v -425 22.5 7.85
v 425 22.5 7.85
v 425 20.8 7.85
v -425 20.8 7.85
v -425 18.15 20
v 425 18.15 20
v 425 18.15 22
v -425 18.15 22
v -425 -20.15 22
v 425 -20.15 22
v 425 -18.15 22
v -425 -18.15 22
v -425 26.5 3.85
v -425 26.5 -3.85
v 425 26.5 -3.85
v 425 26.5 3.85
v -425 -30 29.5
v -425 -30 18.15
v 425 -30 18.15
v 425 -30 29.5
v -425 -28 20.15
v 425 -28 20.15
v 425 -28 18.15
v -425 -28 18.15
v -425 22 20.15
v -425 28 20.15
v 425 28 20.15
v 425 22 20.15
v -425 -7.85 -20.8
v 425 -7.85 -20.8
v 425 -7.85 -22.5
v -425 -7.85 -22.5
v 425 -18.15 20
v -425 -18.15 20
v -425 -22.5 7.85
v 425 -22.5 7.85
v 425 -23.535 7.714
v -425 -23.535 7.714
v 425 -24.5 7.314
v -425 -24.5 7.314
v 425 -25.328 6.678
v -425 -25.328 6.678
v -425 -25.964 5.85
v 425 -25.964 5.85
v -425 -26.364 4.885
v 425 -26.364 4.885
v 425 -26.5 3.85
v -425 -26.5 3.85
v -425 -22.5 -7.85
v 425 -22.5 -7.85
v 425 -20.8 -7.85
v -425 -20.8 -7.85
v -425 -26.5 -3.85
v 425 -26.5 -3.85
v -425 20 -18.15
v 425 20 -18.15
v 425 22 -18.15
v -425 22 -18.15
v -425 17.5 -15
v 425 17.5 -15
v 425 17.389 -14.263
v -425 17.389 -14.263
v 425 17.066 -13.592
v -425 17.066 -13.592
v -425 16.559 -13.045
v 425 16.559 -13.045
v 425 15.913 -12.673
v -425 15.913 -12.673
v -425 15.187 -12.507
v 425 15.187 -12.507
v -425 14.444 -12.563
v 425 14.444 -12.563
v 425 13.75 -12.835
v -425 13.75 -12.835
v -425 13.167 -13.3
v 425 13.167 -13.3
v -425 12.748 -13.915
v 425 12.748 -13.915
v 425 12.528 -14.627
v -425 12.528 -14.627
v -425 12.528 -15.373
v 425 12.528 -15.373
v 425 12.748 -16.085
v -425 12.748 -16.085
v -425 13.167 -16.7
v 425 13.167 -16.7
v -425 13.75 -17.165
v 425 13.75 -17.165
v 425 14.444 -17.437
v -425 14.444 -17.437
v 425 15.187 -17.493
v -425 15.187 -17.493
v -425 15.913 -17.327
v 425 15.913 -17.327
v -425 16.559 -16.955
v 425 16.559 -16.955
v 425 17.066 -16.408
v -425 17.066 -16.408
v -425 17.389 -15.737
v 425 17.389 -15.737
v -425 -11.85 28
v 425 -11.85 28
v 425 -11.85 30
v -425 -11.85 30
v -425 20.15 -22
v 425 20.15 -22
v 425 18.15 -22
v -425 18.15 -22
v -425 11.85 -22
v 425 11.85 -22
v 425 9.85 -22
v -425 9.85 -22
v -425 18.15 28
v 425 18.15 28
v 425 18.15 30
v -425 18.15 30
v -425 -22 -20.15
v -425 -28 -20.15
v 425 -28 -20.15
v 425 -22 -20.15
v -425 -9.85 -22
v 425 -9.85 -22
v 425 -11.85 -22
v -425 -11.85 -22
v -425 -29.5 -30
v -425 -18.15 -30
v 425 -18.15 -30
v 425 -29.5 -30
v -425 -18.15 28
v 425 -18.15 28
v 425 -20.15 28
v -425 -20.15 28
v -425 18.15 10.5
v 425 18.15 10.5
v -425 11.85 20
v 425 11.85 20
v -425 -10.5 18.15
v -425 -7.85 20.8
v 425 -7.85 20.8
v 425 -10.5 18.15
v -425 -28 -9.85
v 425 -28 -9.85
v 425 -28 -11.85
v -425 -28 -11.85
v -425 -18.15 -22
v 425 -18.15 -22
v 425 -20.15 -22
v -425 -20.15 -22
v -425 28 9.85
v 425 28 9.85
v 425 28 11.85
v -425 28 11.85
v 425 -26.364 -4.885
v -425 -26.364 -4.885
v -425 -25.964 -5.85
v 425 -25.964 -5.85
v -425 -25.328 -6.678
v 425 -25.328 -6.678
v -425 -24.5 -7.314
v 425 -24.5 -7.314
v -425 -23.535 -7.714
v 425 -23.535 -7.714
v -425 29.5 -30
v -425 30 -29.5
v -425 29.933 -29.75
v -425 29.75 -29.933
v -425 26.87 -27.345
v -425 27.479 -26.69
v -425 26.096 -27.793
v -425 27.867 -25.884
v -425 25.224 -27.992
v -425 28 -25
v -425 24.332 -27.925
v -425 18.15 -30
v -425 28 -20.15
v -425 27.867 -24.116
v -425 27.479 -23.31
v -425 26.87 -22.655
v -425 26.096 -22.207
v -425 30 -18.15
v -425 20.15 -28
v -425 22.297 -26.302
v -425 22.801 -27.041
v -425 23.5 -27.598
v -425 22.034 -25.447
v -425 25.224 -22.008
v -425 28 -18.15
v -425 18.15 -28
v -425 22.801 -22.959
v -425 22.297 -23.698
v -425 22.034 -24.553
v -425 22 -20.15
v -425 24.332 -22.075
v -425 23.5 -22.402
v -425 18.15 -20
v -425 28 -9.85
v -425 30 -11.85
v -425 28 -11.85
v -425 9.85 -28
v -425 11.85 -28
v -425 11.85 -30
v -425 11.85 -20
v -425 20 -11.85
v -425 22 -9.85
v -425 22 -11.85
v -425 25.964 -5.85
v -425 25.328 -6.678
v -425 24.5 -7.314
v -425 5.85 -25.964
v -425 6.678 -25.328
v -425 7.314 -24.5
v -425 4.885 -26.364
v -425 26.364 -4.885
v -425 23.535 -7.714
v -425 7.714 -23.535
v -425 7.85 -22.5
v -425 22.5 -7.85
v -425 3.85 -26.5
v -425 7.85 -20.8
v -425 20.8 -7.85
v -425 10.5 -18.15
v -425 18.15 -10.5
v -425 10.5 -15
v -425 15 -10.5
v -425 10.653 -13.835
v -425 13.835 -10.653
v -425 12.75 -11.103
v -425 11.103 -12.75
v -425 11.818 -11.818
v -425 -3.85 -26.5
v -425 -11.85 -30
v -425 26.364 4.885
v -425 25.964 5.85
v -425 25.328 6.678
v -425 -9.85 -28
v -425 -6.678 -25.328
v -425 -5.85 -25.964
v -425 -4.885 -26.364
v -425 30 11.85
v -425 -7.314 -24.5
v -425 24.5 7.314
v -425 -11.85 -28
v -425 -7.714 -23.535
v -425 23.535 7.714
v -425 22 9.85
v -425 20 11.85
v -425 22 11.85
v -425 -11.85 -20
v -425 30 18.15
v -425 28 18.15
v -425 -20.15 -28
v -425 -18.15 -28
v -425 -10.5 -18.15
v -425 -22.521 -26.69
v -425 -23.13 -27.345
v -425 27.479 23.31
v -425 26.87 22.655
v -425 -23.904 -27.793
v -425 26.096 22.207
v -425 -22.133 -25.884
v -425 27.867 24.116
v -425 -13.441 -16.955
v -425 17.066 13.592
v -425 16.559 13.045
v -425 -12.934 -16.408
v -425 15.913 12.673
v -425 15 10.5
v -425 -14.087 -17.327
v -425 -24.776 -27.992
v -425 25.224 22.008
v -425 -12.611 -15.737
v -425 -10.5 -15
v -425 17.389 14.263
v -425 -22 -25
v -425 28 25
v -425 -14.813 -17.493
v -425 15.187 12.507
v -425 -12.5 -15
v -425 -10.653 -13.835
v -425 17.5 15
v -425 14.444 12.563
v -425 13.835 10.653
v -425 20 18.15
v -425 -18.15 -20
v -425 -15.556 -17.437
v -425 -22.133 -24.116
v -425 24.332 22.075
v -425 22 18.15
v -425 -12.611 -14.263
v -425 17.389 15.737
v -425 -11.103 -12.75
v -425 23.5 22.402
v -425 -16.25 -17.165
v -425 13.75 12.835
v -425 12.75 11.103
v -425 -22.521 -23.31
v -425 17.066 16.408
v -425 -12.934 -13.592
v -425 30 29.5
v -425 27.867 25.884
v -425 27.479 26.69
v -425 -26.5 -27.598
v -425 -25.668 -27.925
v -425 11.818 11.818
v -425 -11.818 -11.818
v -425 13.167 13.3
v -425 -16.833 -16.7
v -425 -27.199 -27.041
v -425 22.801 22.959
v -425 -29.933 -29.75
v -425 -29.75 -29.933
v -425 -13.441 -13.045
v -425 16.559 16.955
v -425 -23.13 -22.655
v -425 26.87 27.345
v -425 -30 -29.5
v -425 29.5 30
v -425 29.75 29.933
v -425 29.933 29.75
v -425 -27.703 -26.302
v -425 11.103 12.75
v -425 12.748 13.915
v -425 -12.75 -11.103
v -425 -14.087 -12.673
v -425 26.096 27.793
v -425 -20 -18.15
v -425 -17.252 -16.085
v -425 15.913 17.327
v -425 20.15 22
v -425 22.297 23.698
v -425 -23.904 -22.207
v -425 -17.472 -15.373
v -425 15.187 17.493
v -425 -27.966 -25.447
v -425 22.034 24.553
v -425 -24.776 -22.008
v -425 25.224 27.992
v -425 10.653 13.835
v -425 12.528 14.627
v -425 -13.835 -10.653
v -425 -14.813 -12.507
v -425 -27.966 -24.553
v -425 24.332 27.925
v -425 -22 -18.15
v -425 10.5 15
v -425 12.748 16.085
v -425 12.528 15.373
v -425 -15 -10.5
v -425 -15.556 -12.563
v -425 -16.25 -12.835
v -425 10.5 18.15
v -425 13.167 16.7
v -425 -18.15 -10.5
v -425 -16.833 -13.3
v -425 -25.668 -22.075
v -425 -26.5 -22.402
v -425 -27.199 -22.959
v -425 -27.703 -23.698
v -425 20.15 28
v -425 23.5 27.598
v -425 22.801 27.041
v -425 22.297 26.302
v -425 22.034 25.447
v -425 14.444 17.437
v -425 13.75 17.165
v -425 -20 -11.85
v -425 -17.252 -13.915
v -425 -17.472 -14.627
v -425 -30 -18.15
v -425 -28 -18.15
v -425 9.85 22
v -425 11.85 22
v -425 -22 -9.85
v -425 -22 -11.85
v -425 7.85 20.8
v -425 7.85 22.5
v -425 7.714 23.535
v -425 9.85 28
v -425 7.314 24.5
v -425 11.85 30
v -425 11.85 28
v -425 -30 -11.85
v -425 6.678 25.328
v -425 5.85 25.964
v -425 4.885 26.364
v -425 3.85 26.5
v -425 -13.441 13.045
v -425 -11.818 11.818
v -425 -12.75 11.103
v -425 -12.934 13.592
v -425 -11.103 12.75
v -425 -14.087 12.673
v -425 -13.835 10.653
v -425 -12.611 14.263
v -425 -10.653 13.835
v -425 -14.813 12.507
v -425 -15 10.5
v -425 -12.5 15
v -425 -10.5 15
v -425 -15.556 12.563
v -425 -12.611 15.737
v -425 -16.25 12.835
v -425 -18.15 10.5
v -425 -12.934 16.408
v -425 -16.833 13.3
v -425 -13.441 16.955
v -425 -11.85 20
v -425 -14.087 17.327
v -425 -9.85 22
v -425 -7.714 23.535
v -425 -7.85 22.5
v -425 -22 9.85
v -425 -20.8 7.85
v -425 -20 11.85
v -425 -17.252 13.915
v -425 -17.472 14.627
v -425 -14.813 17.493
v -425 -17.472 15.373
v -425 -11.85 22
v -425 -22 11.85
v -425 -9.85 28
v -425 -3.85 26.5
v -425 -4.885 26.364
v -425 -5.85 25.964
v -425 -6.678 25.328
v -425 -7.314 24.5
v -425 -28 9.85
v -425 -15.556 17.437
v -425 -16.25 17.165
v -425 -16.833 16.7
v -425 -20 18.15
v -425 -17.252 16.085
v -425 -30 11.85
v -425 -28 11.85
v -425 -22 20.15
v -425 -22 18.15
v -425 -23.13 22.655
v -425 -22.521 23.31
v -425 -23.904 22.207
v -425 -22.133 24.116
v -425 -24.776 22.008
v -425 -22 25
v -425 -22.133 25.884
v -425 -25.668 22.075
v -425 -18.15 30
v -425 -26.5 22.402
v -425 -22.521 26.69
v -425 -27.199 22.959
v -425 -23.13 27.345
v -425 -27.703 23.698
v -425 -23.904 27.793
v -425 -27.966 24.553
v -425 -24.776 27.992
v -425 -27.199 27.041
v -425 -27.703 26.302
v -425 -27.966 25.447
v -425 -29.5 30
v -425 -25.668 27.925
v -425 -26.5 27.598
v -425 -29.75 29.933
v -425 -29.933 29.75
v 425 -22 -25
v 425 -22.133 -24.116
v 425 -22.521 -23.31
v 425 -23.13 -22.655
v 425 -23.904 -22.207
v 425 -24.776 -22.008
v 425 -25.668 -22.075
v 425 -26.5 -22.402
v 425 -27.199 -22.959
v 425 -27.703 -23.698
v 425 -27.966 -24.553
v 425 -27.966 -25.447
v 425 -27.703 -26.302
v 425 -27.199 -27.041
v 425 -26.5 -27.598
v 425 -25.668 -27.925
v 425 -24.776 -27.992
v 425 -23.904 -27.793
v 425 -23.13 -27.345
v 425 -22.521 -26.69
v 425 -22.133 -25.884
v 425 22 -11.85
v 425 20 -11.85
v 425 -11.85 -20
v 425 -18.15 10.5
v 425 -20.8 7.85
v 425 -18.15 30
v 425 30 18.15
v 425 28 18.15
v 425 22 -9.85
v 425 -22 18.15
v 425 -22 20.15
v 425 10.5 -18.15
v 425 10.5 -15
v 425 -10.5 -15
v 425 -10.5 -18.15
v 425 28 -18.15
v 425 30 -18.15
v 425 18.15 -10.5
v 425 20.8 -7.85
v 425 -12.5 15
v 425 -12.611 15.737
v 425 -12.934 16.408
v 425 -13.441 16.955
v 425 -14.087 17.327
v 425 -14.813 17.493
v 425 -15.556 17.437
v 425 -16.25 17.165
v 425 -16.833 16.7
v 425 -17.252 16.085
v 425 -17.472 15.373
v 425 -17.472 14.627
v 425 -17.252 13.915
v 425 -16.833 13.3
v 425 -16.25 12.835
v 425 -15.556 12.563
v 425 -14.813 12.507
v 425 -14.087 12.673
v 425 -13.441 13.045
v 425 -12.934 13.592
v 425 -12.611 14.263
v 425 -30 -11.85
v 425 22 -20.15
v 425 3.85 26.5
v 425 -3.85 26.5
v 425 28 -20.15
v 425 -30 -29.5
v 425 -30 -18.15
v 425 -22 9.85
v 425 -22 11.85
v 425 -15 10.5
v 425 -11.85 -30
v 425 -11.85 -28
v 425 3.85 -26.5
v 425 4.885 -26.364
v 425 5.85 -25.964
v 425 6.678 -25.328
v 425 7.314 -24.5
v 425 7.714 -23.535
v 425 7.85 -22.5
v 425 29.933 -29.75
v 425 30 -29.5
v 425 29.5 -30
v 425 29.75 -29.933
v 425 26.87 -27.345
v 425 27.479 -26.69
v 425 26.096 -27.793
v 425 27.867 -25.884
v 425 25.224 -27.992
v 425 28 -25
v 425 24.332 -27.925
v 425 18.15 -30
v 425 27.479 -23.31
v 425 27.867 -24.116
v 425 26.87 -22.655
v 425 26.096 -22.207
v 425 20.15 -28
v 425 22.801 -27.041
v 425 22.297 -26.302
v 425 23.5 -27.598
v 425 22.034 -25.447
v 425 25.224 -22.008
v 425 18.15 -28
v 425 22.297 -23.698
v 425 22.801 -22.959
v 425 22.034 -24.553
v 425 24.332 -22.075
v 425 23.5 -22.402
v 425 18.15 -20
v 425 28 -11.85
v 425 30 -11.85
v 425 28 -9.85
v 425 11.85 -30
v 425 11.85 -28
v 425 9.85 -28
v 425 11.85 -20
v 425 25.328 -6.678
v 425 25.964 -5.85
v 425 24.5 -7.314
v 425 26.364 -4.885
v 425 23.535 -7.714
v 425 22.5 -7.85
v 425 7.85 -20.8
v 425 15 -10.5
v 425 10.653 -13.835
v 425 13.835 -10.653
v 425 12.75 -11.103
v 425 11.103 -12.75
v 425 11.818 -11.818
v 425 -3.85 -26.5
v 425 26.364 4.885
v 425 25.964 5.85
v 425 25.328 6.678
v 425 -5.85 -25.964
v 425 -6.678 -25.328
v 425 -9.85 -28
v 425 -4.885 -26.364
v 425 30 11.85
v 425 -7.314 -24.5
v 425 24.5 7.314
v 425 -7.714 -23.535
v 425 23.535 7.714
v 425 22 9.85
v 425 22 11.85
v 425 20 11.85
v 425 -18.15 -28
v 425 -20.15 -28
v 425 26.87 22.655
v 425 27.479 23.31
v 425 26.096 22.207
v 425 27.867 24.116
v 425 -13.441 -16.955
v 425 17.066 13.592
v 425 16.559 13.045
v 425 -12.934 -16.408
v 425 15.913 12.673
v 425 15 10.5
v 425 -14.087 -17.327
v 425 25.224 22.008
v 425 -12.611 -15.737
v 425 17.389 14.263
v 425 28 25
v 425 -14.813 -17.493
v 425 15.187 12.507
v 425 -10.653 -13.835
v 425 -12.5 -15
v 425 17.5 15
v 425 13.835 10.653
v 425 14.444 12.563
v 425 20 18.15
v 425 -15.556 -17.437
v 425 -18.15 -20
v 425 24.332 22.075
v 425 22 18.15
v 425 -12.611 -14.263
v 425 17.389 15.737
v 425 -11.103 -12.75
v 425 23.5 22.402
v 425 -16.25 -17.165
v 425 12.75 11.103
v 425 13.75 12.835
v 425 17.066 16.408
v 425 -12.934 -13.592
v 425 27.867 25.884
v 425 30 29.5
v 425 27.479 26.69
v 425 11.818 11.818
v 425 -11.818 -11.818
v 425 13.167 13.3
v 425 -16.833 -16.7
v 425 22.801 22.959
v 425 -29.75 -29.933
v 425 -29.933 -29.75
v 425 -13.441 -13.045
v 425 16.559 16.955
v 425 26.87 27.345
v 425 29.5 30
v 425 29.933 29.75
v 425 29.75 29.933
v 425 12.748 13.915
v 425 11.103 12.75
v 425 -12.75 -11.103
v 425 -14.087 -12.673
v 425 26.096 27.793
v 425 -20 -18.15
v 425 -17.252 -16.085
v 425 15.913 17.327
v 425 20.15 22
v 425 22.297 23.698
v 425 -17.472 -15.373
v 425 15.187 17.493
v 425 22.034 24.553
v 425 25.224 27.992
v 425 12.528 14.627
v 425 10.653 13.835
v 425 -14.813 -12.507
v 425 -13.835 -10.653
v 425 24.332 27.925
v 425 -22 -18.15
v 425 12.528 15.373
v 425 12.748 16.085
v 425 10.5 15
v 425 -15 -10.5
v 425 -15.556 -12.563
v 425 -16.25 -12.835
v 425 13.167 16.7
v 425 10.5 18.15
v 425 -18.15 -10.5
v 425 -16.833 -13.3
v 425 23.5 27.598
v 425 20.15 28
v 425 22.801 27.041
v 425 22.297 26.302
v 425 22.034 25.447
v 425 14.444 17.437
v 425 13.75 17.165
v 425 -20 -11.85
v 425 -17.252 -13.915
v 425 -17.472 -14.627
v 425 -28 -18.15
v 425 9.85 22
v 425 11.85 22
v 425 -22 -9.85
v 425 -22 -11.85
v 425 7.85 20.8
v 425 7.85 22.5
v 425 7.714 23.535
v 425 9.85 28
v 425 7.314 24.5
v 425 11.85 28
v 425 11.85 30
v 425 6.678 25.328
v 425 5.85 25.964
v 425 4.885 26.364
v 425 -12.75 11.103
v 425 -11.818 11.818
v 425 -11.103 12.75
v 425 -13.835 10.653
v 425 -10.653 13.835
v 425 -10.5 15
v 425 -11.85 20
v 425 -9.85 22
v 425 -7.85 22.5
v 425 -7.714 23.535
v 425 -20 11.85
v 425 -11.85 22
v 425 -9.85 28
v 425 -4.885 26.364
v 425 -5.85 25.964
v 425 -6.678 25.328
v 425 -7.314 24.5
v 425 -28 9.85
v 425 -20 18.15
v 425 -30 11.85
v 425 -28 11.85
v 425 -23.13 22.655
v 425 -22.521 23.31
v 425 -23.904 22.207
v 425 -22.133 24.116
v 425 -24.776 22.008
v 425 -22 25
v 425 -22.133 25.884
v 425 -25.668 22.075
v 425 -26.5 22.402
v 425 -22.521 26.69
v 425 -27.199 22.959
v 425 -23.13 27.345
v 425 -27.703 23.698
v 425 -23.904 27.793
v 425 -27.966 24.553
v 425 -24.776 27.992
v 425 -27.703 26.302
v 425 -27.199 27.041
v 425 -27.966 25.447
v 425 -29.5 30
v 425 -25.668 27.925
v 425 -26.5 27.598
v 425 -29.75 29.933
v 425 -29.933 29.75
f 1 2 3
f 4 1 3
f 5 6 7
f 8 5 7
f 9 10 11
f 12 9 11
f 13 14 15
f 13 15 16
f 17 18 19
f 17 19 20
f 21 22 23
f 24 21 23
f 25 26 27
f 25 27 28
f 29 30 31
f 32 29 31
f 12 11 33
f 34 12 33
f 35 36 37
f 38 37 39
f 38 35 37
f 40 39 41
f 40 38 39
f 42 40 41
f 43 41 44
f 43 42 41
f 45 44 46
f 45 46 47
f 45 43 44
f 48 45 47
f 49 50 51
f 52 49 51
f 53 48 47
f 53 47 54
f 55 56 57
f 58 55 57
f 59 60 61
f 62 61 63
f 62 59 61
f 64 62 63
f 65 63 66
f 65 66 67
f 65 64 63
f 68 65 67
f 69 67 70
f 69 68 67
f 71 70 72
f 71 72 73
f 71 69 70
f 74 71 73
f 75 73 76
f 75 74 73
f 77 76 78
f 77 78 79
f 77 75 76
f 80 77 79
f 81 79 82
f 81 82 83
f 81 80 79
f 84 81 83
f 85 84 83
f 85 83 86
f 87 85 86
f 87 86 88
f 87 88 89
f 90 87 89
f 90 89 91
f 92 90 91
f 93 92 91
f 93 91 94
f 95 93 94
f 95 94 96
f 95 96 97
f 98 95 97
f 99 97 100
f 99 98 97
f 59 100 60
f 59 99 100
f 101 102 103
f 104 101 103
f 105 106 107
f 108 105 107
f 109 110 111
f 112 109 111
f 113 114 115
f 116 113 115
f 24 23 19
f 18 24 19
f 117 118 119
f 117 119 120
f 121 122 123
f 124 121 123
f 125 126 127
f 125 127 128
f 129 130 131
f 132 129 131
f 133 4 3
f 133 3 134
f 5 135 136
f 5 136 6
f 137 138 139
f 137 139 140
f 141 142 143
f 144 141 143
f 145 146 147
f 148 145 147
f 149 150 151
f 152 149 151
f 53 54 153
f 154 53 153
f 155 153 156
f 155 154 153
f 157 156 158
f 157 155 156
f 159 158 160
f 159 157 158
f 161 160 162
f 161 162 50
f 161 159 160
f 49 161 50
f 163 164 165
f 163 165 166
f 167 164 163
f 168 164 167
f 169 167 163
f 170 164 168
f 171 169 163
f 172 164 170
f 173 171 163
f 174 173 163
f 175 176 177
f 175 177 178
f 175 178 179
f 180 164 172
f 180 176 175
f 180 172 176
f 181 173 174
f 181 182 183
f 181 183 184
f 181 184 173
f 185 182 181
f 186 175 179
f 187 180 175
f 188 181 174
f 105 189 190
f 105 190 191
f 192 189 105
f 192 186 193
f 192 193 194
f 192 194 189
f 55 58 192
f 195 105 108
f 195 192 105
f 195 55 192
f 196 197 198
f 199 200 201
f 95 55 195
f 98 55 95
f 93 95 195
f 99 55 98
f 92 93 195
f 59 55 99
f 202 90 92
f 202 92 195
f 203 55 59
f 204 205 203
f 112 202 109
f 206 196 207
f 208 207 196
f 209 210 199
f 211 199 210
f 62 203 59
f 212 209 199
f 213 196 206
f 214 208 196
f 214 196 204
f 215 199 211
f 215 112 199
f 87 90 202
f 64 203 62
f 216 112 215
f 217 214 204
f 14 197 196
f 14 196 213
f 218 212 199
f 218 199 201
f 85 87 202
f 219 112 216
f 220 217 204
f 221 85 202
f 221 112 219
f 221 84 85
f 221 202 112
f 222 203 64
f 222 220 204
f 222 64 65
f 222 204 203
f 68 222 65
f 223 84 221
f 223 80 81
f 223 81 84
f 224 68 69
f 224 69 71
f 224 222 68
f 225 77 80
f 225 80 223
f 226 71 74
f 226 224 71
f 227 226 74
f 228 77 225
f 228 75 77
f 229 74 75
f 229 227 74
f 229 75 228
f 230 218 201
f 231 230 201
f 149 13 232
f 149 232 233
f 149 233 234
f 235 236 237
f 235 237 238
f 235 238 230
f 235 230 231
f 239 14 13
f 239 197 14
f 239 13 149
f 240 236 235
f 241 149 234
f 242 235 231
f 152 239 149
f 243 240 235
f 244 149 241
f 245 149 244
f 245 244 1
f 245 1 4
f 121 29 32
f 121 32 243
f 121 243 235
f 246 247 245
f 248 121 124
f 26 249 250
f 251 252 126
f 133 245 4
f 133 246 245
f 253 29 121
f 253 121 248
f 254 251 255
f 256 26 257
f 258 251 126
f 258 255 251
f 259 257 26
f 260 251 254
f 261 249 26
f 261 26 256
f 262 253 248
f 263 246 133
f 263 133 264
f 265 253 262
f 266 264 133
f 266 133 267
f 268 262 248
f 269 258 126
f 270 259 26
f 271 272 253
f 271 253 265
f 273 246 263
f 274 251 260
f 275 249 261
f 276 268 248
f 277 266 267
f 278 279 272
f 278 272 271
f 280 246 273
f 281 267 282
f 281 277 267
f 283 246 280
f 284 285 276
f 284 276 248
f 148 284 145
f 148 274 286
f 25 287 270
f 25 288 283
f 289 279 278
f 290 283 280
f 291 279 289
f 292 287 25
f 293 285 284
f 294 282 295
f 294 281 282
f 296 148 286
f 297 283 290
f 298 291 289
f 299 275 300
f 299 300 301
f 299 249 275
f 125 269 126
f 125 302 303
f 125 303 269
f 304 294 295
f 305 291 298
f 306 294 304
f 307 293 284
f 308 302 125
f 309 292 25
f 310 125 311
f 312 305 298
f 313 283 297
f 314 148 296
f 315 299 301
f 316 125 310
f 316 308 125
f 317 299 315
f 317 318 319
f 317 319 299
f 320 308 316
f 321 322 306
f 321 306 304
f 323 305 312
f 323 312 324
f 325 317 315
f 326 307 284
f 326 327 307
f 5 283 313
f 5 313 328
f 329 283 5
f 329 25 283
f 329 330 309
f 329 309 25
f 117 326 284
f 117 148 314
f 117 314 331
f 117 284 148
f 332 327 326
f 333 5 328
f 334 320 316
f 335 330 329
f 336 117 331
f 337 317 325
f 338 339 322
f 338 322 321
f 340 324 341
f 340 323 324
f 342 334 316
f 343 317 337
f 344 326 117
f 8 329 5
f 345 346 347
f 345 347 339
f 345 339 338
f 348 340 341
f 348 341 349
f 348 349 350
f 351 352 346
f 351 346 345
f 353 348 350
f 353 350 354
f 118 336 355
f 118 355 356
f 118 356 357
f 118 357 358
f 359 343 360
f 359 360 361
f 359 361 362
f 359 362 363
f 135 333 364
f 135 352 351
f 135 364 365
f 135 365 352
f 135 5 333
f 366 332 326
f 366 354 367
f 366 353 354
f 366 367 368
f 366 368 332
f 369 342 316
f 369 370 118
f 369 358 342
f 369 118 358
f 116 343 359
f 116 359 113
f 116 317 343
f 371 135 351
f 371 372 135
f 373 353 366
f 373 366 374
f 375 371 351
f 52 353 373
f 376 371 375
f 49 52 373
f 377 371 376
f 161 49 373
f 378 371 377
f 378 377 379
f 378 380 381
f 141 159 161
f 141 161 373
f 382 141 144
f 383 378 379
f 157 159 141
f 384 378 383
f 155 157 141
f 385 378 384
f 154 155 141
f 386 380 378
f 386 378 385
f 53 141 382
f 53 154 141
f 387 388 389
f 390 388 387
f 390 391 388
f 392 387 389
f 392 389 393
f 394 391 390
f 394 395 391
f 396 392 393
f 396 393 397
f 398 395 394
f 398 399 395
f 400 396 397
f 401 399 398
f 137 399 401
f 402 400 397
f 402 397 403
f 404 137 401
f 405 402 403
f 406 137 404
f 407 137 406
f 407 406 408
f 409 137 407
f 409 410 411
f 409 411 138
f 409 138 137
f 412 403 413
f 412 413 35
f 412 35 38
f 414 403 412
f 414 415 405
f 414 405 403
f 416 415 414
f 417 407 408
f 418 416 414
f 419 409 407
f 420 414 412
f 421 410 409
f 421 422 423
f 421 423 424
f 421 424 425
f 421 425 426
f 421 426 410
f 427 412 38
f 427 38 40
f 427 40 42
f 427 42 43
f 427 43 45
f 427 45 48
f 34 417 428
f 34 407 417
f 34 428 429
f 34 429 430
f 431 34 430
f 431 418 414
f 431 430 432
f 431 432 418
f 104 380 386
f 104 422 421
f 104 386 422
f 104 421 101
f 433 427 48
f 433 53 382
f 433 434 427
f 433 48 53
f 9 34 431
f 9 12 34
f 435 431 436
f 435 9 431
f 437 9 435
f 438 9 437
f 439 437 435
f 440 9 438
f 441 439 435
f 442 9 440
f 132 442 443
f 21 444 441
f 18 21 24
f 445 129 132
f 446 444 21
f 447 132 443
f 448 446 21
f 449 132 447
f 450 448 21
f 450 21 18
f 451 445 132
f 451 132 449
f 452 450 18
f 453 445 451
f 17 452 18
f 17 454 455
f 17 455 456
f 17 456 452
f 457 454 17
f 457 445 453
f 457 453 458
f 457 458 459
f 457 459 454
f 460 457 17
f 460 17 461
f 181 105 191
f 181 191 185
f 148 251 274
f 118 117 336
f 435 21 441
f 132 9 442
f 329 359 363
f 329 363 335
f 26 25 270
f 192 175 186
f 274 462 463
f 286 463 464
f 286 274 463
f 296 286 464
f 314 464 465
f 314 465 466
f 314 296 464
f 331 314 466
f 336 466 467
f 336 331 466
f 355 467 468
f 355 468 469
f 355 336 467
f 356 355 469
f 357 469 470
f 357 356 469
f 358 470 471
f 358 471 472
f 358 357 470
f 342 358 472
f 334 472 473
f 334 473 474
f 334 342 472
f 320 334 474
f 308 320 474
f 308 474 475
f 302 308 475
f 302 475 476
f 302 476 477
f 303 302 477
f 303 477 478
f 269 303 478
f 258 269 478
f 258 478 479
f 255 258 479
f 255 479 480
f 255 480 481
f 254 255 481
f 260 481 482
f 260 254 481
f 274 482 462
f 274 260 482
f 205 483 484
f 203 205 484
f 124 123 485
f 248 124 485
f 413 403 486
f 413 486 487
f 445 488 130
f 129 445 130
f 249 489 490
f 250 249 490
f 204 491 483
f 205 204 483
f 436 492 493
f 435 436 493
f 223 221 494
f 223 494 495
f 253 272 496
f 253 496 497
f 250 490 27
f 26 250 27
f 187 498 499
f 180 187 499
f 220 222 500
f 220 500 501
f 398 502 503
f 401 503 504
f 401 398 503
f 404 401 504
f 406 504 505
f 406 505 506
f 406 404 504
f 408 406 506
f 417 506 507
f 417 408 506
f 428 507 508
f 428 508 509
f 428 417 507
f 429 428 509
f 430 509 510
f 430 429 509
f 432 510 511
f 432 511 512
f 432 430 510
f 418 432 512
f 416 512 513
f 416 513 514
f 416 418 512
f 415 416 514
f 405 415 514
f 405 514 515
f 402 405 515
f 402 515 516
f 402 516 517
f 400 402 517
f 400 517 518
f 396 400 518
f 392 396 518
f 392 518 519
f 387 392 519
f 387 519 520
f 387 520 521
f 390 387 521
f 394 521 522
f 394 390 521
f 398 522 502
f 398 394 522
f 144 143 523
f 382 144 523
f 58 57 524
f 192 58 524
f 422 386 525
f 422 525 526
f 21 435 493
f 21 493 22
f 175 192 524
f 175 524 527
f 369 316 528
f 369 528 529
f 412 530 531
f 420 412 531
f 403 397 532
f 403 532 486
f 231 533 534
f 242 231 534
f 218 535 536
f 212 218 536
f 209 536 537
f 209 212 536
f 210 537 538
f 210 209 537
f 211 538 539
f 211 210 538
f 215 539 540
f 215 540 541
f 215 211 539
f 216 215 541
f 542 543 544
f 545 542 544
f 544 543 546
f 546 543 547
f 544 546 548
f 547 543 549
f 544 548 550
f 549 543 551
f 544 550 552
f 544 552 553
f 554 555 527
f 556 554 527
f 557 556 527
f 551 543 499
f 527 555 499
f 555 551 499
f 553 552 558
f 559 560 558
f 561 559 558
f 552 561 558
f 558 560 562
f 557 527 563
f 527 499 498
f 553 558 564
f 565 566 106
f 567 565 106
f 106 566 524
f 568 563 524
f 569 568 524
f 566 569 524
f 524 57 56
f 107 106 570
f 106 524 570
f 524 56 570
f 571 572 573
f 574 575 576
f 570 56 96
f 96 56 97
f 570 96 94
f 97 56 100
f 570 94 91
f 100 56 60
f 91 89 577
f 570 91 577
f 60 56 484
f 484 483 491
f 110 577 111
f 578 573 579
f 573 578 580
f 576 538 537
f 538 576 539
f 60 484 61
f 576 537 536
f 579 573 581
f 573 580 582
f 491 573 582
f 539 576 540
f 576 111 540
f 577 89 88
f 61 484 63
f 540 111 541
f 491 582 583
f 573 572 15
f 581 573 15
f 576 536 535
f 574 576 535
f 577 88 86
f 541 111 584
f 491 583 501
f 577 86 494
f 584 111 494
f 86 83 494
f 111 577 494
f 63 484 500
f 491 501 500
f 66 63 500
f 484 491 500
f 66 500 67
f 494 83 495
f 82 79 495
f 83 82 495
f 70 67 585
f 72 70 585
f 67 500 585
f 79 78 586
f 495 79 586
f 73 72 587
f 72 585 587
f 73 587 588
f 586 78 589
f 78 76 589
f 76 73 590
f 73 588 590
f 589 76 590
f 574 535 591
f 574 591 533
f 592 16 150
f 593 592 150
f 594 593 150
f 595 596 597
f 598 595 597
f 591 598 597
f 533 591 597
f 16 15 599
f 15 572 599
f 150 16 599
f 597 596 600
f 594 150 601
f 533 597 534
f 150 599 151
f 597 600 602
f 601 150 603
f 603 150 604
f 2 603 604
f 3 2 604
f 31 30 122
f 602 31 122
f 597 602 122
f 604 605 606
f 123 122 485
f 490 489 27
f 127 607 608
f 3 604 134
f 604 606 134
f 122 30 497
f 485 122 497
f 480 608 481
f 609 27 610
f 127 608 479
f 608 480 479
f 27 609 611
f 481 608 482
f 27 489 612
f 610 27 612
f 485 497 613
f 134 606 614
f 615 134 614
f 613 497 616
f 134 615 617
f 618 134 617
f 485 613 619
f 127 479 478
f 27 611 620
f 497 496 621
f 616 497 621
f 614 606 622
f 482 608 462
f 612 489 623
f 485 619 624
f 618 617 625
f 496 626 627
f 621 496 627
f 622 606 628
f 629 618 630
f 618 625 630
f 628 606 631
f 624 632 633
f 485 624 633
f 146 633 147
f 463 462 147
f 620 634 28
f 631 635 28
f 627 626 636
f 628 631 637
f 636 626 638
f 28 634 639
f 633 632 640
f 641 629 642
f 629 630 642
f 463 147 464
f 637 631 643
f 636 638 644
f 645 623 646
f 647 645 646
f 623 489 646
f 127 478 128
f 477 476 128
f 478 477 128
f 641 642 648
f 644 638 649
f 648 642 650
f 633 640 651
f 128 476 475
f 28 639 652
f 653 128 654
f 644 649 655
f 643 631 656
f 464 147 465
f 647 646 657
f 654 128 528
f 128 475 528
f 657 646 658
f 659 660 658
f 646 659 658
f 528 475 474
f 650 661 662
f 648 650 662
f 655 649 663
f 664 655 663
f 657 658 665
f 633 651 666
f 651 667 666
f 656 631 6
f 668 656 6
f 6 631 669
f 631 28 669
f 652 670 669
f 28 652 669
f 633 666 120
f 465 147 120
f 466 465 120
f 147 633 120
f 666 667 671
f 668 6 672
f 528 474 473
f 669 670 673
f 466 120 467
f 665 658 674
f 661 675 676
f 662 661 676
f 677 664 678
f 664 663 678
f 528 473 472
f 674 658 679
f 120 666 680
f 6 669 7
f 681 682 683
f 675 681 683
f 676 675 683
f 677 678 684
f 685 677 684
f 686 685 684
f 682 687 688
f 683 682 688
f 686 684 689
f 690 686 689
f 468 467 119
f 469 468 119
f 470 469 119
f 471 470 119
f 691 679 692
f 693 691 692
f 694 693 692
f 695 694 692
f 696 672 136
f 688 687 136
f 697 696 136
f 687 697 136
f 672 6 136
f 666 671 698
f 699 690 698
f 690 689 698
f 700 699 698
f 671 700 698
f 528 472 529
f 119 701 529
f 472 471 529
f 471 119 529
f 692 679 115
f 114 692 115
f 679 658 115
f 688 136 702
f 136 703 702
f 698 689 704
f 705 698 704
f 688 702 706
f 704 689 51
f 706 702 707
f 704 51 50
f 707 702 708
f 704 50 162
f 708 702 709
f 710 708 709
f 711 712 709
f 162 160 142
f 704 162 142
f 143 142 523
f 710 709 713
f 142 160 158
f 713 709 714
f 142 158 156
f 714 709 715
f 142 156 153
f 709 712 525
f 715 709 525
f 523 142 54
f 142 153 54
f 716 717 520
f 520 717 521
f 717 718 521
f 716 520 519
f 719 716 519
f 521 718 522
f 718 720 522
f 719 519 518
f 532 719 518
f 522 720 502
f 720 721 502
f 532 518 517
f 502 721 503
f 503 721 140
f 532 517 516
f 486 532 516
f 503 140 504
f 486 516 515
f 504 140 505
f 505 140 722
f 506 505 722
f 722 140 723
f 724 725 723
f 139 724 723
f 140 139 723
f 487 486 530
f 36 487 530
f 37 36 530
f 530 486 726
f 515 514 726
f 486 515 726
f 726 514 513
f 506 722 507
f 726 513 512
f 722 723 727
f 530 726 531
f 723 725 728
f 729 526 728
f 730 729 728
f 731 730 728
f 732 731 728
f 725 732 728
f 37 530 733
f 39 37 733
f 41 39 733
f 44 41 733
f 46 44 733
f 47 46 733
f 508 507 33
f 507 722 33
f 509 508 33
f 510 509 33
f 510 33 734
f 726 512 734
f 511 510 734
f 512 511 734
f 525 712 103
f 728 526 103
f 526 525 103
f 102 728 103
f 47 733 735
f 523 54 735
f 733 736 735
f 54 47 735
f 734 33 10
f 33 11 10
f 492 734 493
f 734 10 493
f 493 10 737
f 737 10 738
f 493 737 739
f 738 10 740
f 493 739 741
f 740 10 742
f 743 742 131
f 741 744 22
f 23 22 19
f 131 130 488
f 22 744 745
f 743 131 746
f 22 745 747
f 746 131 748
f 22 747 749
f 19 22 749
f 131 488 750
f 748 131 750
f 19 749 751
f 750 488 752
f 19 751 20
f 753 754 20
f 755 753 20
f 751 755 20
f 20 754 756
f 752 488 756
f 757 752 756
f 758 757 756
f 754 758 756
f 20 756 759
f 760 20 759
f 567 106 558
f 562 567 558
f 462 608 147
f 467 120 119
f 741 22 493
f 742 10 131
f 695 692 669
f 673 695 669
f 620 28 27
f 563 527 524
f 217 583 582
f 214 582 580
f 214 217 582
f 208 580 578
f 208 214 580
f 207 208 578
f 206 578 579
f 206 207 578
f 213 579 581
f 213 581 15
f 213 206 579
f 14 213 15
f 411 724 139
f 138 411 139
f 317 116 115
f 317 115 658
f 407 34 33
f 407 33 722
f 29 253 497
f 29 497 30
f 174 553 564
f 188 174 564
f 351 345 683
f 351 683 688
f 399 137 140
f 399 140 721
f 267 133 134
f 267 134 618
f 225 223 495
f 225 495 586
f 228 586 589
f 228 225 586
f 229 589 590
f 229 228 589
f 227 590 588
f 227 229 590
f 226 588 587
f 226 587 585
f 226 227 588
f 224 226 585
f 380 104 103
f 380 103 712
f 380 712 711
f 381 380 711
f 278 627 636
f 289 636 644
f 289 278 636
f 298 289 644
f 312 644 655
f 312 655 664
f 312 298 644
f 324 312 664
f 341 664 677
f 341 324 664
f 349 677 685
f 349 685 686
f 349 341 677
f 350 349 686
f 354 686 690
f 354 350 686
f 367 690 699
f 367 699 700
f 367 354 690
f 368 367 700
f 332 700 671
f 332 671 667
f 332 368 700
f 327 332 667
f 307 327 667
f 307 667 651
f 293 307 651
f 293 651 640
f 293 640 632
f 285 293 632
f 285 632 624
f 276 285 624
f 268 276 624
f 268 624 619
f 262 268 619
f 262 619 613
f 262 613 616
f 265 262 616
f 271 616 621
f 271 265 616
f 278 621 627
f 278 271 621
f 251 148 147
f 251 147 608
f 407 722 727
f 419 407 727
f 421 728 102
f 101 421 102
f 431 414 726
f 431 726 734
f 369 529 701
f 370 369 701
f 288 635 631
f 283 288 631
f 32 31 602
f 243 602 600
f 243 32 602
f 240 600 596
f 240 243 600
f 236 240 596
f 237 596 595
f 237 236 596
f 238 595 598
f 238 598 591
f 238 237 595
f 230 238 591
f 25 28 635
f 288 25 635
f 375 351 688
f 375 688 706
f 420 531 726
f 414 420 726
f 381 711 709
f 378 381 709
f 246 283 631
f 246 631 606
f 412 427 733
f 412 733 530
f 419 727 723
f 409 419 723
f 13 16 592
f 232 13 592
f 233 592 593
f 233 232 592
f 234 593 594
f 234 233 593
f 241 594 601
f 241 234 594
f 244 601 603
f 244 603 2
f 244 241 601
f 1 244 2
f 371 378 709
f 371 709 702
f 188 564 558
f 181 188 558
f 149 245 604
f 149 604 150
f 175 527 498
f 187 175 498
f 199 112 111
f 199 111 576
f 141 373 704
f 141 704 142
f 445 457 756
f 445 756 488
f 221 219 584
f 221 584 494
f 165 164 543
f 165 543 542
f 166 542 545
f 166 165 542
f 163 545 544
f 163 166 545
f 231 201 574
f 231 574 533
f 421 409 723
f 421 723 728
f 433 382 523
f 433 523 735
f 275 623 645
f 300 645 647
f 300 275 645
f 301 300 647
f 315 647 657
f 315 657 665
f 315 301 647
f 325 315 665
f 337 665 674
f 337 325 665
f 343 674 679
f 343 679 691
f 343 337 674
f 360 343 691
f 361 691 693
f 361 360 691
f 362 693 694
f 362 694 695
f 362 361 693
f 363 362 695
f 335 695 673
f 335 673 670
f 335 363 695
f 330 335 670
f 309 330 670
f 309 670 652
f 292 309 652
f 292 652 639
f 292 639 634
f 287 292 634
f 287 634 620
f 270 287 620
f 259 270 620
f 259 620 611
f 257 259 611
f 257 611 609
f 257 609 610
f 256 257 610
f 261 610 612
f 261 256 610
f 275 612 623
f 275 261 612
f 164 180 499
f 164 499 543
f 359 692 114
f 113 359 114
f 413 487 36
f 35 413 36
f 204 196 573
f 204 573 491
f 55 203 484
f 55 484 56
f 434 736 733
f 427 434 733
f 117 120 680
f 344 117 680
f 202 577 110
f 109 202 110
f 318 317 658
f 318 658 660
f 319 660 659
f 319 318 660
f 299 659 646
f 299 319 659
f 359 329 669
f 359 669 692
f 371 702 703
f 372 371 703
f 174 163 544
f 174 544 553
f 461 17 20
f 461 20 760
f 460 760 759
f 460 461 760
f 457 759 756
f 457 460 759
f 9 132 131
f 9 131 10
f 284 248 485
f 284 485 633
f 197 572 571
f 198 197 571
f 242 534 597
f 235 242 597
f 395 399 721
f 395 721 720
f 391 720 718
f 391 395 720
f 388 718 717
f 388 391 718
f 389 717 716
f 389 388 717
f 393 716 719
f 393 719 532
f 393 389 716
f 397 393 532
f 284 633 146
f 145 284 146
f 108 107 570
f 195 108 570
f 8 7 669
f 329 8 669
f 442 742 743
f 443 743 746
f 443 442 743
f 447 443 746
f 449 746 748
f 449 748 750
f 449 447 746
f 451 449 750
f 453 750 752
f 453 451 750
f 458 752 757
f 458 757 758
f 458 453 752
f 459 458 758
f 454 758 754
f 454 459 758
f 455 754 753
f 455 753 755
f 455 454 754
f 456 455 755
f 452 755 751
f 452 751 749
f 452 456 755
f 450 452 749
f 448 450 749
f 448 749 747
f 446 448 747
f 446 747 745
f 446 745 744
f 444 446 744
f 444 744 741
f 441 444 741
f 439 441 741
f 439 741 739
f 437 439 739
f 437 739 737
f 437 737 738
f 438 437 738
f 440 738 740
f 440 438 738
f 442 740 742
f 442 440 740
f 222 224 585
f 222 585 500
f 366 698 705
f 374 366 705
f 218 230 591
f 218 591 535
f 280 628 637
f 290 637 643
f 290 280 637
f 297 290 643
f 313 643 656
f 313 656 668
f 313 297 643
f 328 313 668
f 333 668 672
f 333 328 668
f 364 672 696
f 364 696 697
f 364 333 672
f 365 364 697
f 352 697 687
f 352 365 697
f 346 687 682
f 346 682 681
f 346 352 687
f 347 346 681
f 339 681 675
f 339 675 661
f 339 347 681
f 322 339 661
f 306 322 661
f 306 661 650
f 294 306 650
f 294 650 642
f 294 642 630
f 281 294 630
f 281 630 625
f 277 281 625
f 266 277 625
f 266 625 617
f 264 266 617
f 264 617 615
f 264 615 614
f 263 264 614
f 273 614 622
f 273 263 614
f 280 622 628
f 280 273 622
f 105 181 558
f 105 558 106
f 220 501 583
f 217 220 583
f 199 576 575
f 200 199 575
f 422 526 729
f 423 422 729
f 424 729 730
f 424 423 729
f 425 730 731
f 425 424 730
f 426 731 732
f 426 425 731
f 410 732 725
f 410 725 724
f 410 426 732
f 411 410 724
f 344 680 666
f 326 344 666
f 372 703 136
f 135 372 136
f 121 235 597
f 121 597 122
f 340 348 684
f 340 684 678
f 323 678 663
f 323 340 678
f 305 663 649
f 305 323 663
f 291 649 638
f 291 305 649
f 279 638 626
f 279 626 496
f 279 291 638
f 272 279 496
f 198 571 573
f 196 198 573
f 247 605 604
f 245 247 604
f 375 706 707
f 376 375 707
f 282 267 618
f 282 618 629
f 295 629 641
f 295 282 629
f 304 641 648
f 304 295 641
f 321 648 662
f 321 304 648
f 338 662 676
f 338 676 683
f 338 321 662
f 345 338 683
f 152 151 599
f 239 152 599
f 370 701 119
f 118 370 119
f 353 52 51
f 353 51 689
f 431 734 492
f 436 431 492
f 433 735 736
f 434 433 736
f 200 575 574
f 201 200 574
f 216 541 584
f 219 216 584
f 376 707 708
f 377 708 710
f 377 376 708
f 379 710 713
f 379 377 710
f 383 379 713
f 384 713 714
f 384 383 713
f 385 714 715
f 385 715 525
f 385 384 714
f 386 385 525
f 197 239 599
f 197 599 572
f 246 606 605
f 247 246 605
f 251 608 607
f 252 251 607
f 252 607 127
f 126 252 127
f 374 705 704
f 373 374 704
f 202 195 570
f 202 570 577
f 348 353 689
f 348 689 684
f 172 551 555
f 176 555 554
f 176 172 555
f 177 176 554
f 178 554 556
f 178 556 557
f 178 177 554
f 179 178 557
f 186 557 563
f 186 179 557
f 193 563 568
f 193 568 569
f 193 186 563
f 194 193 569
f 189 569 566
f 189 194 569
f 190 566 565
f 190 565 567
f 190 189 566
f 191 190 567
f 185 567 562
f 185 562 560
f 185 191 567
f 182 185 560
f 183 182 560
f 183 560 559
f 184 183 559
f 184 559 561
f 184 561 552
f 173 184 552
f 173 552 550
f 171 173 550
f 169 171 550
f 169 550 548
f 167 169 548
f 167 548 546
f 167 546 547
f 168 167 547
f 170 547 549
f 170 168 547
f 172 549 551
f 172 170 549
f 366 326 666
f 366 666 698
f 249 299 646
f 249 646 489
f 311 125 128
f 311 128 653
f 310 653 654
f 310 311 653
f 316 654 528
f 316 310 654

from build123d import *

# Parameters (mm, degrees)
SKETCH_14_R                 = 3
SKETCH_14_R_2               = 2.5
GB_T5237_2004_6060G_1_DEPTH = 850


with BuildPart() as part:
    # 草图14 → 铝型材（gb t5237-2004） 6060G(1) (new body)
    with BuildSketch(Plane.YZ.offset(-425)):
        with BuildLine():
            Line((28, -18.15), (30, -18.15))
            Line((30, -18.15), (30, -29.5))
            ThreePointArc((30, -29.5), (29.853553391, -29.853553391), (29.5, -30))
            Line((29.5, -30), (18.15, -30))
            Line((18.15, -30), (18.15, -28))
            Line((18.15, -28), (20.15, -28))
            Line((20.15, -28), (20.15, -22))
            Line((20.15, -22), (18.15, -22))
            Line((18.15, -22), (18.15, -20))
            Line((18.15, -20), (11.85, -20))
            Line((11.85, -20), (11.85, -22))
            Line((11.85, -22), (9.85, -22))
            Line((9.85, -22), (9.85, -28))
            Line((9.85, -28), (11.85, -28))
            Line((11.85, -28), (11.85, -30))
            Line((11.85, -30), (-11.85, -30))
            Line((-11.85, -30), (-11.85, -28))
            Line((-11.85, -28), (-9.85, -28))
            Line((-9.85, -28), (-9.85, -22))
            Line((-9.85, -22), (-11.85, -22))
            Line((-11.85, -22), (-11.85, -20))
            Line((-11.85, -20), (-18.15, -20))
            Line((-18.15, -20), (-18.15, -22))
            Line((-18.15, -22), (-20.15, -22))
            Line((-20.15, -22), (-20.15, -28))
            Line((-20.15, -28), (-18.15, -28))
            Line((-18.15, -28), (-18.15, -30))
            Line((-18.15, -30), (-29.5, -30))
            ThreePointArc((-29.5, -30), (-29.853553391, -29.853553391), (-30, -29.5))
            Line((-30, -29.5), (-30, -18.15))
            Line((-30, -18.15), (-28, -18.15))
            Line((-28, -18.15), (-28, -20.15))
            Line((-28, -20.15), (-22, -20.15))
            Line((-22, -20.15), (-22, -18.15))
            Line((-22, -18.15), (-20, -18.15))
            Line((-20, -18.15), (-20, -11.85))
            Line((-20, -11.85), (-22, -11.85))
            Line((-22, -11.85), (-22, -9.85))
            Line((-22, -9.85), (-28, -9.85))
            Line((-28, -9.85), (-28, -11.85))
            Line((-28, -11.85), (-30, -11.85))
            Line((-30, -11.85), (-30, 11.85))
            Line((-30, 11.85), (-28, 11.85))
            Line((-28, 11.85), (-28, 9.85))
            Line((-28, 9.85), (-22, 9.85))
            Line((-22, 9.85), (-22, 11.85))
            Line((-22, 11.85), (-20, 11.85))
            Line((-20, 11.85), (-20, 18.15))
            Line((-20, 18.15), (-22, 18.15))
            Line((-22, 18.15), (-22, 20.15))
            Line((-22, 20.15), (-28, 20.15))
            Line((-28, 20.15), (-28, 18.15))
            Line((-28, 18.15), (-30, 18.15))
            Line((-30, 18.15), (-30, 29.5))
            ThreePointArc((-30, 29.5), (-29.853553391, 29.853553391), (-29.5, 30))
            Line((-29.5, 30), (-18.15, 30))
            Line((-18.15, 30), (-18.15, 28))
            Line((-18.15, 28), (-20.15, 28))
            Line((-20.15, 28), (-20.15, 22))
            Line((-20.15, 22), (-18.15, 22))
            Line((-18.15, 22), (-18.15, 20))
            Line((-18.15, 20), (-11.85, 20))
            Line((-11.85, 20), (-11.85, 22))
            Line((-11.85, 22), (-9.85, 22))
            Line((-9.85, 22), (-9.85, 28))
            Line((-9.85, 28), (-11.85, 28))
            Line((-11.85, 28), (-11.85, 30))
            Line((-11.85, 30), (11.85, 30))
            Line((11.85, 30), (11.85, 28))
            Line((11.85, 28), (9.85, 28))
            Line((9.85, 28), (9.85, 22))
            Line((9.85, 22), (11.85, 22))
            Line((11.85, 22), (11.85, 20))
            Line((11.85, 20), (18.15, 20))
            Line((18.15, 20), (18.15, 22))
            Line((18.15, 22), (20.15, 22))
            Line((20.15, 22), (20.15, 28))
            Line((20.15, 28), (18.15, 28))
            Line((18.15, 28), (18.15, 30))
            Line((18.15, 30), (29.5, 30))
            ThreePointArc((29.5, 30), (29.853553391, 29.853553391), (30, 29.5))
            Line((30, 29.5), (30, 18.15))
            Line((30, 18.15), (28, 18.15))
            Line((28, 18.15), (28, 20.15))
            Line((28, 20.15), (22, 20.15))
            Line((22, 20.15), (22, 18.15))
            Line((22, 18.15), (20, 18.15))
            Line((20, 18.15), (20, 11.85))
            Line((20, 11.85), (22, 11.85))
            Line((22, 11.85), (22, 9.85))
            Line((22, 9.85), (28, 9.85))
            Line((28, 9.85), (28, 11.85))
            Line((28, 11.85), (30, 11.85))
            Line((30, 11.85), (30, -11.85))
            Line((30, -11.85), (28, -11.85))
            Line((28, -11.85), (28, -9.85))
            Line((28, -9.85), (22, -9.85))
            Line((22, -9.85), (22, -11.85))
            Line((22, -11.85), (20, -11.85))
            Line((20, -11.85), (20, -18.15))
            Line((20, -18.15), (22, -18.15))
            Line((22, -18.15), (22, -20.15))
            Line((22, -20.15), (28, -20.15))
            Line((28, -20.15), (28, -18.15))
        make_face()
        with Locations((25, 25)):
            Circle(SKETCH_14_R, mode=Mode.SUBTRACT)
        with Locations((-15, 15)):
            Circle(SKETCH_14_R_2, mode=Mode.SUBTRACT)
        with Locations((-25, -25)):
            Circle(SKETCH_14_R, mode=Mode.SUBTRACT)
        with Locations((25, -25)):
            Circle(SKETCH_14_R, mode=Mode.SUBTRACT)
        with Locations((15, -15)):
            Circle(SKETCH_14_R_2, mode=Mode.SUBTRACT)
        with Locations((-15, -15)):
            Circle(SKETCH_14_R_2, mode=Mode.SUBTRACT)
        with Locations((-25, 25)):
            Circle(SKETCH_14_R, mode=Mode.SUBTRACT)
        with Locations((15, 15)):
            Circle(SKETCH_14_R_2, mode=Mode.SUBTRACT)
        with BuildLine():
            Line((18.15, -10.5), (20.8, -7.85))
            Line((20.8, -7.85), (22.5, -7.85))
            ThreePointArc((22.5, -7.85), (25.328427125, -6.678427125), (26.5, -3.85))
            Line((26.5, -3.85), (26.5, 3.85))
            ThreePointArc((26.5, 3.85), (25.328427125, 6.678427125), (22.5, 7.85))
            Line((22.5, 7.85), (20.8, 7.85))
            Line((20.8, 7.85), (18.15, 10.5))
            Line((18.15, 10.5), (15, 10.5))
            ThreePointArc((15, 10.5), (11.818019485, 11.818019485), (10.5, 15))
            Line((10.5, 15), (10.5, 18.15))
            Line((10.5, 18.15), (7.85, 20.8))
            Line((7.85, 20.8), (7.85, 22.5))
            ThreePointArc((7.85, 22.5), (6.678427125, 25.328427125), (3.85, 26.5))
            Line((3.85, 26.5), (-3.85, 26.5))
            ThreePointArc((-3.85, 26.5), (-6.678427125, 25.328427125), (-7.85, 22.5))
            Line((-7.85, 22.5), (-7.85, 20.8))
            Line((-7.85, 20.8), (-10.5, 18.15))
            Line((-10.5, 18.15), (-10.5, 15))
            ThreePointArc((-10.5, 15), (-11.818019485, 11.818019485), (-15, 10.5))
            Line((-15, 10.5), (-18.15, 10.5))
            Line((-18.15, 10.5), (-20.8, 7.85))
            Line((-20.8, 7.85), (-22.5, 7.85))
            ThreePointArc((-22.5, 7.85), (-25.328427125, 6.678427125), (-26.5, 3.85))
            Line((-26.5, 3.85), (-26.5, -3.85))
            ThreePointArc((-26.5, -3.85), (-25.328427125, -6.678427125), (-22.5, -7.85))
            Line((-22.5, -7.85), (-20.8, -7.85))
            Line((-20.8, -7.85), (-18.15, -10.5))
            Line((-18.15, -10.5), (-15, -10.5))
            ThreePointArc((-15, -10.5), (-11.818019485, -11.818019485), (-10.5, -15))
            Line((-10.5, -15), (-10.5, -18.15))
            Line((-10.5, -18.15), (-7.85, -20.8))
            Line((-7.85, -20.8), (-7.85, -22.5))
            ThreePointArc((-7.85, -22.5), (-6.678427125, -25.328427125), (-3.85, -26.5))
            Line((-3.85, -26.5), (3.85, -26.5))
            ThreePointArc((3.85, -26.5), (6.678427125, -25.328427125), (7.85, -22.5))
            Line((7.85, -22.5), (7.85, -20.8))
            Line((7.85, -20.8), (10.5, -18.15))
            Line((10.5, -18.15), (10.5, -15))
            ThreePointArc((10.5, -15), (11.818019485, -11.818019485), (15, -10.5))
            Line((15, -10.5), (18.15, -10.5))
        make_face(mode=Mode.SUBTRACT)
    extrude(amount=GB_T5237_2004_6060G_1_DEPTH)


solid = part.part
